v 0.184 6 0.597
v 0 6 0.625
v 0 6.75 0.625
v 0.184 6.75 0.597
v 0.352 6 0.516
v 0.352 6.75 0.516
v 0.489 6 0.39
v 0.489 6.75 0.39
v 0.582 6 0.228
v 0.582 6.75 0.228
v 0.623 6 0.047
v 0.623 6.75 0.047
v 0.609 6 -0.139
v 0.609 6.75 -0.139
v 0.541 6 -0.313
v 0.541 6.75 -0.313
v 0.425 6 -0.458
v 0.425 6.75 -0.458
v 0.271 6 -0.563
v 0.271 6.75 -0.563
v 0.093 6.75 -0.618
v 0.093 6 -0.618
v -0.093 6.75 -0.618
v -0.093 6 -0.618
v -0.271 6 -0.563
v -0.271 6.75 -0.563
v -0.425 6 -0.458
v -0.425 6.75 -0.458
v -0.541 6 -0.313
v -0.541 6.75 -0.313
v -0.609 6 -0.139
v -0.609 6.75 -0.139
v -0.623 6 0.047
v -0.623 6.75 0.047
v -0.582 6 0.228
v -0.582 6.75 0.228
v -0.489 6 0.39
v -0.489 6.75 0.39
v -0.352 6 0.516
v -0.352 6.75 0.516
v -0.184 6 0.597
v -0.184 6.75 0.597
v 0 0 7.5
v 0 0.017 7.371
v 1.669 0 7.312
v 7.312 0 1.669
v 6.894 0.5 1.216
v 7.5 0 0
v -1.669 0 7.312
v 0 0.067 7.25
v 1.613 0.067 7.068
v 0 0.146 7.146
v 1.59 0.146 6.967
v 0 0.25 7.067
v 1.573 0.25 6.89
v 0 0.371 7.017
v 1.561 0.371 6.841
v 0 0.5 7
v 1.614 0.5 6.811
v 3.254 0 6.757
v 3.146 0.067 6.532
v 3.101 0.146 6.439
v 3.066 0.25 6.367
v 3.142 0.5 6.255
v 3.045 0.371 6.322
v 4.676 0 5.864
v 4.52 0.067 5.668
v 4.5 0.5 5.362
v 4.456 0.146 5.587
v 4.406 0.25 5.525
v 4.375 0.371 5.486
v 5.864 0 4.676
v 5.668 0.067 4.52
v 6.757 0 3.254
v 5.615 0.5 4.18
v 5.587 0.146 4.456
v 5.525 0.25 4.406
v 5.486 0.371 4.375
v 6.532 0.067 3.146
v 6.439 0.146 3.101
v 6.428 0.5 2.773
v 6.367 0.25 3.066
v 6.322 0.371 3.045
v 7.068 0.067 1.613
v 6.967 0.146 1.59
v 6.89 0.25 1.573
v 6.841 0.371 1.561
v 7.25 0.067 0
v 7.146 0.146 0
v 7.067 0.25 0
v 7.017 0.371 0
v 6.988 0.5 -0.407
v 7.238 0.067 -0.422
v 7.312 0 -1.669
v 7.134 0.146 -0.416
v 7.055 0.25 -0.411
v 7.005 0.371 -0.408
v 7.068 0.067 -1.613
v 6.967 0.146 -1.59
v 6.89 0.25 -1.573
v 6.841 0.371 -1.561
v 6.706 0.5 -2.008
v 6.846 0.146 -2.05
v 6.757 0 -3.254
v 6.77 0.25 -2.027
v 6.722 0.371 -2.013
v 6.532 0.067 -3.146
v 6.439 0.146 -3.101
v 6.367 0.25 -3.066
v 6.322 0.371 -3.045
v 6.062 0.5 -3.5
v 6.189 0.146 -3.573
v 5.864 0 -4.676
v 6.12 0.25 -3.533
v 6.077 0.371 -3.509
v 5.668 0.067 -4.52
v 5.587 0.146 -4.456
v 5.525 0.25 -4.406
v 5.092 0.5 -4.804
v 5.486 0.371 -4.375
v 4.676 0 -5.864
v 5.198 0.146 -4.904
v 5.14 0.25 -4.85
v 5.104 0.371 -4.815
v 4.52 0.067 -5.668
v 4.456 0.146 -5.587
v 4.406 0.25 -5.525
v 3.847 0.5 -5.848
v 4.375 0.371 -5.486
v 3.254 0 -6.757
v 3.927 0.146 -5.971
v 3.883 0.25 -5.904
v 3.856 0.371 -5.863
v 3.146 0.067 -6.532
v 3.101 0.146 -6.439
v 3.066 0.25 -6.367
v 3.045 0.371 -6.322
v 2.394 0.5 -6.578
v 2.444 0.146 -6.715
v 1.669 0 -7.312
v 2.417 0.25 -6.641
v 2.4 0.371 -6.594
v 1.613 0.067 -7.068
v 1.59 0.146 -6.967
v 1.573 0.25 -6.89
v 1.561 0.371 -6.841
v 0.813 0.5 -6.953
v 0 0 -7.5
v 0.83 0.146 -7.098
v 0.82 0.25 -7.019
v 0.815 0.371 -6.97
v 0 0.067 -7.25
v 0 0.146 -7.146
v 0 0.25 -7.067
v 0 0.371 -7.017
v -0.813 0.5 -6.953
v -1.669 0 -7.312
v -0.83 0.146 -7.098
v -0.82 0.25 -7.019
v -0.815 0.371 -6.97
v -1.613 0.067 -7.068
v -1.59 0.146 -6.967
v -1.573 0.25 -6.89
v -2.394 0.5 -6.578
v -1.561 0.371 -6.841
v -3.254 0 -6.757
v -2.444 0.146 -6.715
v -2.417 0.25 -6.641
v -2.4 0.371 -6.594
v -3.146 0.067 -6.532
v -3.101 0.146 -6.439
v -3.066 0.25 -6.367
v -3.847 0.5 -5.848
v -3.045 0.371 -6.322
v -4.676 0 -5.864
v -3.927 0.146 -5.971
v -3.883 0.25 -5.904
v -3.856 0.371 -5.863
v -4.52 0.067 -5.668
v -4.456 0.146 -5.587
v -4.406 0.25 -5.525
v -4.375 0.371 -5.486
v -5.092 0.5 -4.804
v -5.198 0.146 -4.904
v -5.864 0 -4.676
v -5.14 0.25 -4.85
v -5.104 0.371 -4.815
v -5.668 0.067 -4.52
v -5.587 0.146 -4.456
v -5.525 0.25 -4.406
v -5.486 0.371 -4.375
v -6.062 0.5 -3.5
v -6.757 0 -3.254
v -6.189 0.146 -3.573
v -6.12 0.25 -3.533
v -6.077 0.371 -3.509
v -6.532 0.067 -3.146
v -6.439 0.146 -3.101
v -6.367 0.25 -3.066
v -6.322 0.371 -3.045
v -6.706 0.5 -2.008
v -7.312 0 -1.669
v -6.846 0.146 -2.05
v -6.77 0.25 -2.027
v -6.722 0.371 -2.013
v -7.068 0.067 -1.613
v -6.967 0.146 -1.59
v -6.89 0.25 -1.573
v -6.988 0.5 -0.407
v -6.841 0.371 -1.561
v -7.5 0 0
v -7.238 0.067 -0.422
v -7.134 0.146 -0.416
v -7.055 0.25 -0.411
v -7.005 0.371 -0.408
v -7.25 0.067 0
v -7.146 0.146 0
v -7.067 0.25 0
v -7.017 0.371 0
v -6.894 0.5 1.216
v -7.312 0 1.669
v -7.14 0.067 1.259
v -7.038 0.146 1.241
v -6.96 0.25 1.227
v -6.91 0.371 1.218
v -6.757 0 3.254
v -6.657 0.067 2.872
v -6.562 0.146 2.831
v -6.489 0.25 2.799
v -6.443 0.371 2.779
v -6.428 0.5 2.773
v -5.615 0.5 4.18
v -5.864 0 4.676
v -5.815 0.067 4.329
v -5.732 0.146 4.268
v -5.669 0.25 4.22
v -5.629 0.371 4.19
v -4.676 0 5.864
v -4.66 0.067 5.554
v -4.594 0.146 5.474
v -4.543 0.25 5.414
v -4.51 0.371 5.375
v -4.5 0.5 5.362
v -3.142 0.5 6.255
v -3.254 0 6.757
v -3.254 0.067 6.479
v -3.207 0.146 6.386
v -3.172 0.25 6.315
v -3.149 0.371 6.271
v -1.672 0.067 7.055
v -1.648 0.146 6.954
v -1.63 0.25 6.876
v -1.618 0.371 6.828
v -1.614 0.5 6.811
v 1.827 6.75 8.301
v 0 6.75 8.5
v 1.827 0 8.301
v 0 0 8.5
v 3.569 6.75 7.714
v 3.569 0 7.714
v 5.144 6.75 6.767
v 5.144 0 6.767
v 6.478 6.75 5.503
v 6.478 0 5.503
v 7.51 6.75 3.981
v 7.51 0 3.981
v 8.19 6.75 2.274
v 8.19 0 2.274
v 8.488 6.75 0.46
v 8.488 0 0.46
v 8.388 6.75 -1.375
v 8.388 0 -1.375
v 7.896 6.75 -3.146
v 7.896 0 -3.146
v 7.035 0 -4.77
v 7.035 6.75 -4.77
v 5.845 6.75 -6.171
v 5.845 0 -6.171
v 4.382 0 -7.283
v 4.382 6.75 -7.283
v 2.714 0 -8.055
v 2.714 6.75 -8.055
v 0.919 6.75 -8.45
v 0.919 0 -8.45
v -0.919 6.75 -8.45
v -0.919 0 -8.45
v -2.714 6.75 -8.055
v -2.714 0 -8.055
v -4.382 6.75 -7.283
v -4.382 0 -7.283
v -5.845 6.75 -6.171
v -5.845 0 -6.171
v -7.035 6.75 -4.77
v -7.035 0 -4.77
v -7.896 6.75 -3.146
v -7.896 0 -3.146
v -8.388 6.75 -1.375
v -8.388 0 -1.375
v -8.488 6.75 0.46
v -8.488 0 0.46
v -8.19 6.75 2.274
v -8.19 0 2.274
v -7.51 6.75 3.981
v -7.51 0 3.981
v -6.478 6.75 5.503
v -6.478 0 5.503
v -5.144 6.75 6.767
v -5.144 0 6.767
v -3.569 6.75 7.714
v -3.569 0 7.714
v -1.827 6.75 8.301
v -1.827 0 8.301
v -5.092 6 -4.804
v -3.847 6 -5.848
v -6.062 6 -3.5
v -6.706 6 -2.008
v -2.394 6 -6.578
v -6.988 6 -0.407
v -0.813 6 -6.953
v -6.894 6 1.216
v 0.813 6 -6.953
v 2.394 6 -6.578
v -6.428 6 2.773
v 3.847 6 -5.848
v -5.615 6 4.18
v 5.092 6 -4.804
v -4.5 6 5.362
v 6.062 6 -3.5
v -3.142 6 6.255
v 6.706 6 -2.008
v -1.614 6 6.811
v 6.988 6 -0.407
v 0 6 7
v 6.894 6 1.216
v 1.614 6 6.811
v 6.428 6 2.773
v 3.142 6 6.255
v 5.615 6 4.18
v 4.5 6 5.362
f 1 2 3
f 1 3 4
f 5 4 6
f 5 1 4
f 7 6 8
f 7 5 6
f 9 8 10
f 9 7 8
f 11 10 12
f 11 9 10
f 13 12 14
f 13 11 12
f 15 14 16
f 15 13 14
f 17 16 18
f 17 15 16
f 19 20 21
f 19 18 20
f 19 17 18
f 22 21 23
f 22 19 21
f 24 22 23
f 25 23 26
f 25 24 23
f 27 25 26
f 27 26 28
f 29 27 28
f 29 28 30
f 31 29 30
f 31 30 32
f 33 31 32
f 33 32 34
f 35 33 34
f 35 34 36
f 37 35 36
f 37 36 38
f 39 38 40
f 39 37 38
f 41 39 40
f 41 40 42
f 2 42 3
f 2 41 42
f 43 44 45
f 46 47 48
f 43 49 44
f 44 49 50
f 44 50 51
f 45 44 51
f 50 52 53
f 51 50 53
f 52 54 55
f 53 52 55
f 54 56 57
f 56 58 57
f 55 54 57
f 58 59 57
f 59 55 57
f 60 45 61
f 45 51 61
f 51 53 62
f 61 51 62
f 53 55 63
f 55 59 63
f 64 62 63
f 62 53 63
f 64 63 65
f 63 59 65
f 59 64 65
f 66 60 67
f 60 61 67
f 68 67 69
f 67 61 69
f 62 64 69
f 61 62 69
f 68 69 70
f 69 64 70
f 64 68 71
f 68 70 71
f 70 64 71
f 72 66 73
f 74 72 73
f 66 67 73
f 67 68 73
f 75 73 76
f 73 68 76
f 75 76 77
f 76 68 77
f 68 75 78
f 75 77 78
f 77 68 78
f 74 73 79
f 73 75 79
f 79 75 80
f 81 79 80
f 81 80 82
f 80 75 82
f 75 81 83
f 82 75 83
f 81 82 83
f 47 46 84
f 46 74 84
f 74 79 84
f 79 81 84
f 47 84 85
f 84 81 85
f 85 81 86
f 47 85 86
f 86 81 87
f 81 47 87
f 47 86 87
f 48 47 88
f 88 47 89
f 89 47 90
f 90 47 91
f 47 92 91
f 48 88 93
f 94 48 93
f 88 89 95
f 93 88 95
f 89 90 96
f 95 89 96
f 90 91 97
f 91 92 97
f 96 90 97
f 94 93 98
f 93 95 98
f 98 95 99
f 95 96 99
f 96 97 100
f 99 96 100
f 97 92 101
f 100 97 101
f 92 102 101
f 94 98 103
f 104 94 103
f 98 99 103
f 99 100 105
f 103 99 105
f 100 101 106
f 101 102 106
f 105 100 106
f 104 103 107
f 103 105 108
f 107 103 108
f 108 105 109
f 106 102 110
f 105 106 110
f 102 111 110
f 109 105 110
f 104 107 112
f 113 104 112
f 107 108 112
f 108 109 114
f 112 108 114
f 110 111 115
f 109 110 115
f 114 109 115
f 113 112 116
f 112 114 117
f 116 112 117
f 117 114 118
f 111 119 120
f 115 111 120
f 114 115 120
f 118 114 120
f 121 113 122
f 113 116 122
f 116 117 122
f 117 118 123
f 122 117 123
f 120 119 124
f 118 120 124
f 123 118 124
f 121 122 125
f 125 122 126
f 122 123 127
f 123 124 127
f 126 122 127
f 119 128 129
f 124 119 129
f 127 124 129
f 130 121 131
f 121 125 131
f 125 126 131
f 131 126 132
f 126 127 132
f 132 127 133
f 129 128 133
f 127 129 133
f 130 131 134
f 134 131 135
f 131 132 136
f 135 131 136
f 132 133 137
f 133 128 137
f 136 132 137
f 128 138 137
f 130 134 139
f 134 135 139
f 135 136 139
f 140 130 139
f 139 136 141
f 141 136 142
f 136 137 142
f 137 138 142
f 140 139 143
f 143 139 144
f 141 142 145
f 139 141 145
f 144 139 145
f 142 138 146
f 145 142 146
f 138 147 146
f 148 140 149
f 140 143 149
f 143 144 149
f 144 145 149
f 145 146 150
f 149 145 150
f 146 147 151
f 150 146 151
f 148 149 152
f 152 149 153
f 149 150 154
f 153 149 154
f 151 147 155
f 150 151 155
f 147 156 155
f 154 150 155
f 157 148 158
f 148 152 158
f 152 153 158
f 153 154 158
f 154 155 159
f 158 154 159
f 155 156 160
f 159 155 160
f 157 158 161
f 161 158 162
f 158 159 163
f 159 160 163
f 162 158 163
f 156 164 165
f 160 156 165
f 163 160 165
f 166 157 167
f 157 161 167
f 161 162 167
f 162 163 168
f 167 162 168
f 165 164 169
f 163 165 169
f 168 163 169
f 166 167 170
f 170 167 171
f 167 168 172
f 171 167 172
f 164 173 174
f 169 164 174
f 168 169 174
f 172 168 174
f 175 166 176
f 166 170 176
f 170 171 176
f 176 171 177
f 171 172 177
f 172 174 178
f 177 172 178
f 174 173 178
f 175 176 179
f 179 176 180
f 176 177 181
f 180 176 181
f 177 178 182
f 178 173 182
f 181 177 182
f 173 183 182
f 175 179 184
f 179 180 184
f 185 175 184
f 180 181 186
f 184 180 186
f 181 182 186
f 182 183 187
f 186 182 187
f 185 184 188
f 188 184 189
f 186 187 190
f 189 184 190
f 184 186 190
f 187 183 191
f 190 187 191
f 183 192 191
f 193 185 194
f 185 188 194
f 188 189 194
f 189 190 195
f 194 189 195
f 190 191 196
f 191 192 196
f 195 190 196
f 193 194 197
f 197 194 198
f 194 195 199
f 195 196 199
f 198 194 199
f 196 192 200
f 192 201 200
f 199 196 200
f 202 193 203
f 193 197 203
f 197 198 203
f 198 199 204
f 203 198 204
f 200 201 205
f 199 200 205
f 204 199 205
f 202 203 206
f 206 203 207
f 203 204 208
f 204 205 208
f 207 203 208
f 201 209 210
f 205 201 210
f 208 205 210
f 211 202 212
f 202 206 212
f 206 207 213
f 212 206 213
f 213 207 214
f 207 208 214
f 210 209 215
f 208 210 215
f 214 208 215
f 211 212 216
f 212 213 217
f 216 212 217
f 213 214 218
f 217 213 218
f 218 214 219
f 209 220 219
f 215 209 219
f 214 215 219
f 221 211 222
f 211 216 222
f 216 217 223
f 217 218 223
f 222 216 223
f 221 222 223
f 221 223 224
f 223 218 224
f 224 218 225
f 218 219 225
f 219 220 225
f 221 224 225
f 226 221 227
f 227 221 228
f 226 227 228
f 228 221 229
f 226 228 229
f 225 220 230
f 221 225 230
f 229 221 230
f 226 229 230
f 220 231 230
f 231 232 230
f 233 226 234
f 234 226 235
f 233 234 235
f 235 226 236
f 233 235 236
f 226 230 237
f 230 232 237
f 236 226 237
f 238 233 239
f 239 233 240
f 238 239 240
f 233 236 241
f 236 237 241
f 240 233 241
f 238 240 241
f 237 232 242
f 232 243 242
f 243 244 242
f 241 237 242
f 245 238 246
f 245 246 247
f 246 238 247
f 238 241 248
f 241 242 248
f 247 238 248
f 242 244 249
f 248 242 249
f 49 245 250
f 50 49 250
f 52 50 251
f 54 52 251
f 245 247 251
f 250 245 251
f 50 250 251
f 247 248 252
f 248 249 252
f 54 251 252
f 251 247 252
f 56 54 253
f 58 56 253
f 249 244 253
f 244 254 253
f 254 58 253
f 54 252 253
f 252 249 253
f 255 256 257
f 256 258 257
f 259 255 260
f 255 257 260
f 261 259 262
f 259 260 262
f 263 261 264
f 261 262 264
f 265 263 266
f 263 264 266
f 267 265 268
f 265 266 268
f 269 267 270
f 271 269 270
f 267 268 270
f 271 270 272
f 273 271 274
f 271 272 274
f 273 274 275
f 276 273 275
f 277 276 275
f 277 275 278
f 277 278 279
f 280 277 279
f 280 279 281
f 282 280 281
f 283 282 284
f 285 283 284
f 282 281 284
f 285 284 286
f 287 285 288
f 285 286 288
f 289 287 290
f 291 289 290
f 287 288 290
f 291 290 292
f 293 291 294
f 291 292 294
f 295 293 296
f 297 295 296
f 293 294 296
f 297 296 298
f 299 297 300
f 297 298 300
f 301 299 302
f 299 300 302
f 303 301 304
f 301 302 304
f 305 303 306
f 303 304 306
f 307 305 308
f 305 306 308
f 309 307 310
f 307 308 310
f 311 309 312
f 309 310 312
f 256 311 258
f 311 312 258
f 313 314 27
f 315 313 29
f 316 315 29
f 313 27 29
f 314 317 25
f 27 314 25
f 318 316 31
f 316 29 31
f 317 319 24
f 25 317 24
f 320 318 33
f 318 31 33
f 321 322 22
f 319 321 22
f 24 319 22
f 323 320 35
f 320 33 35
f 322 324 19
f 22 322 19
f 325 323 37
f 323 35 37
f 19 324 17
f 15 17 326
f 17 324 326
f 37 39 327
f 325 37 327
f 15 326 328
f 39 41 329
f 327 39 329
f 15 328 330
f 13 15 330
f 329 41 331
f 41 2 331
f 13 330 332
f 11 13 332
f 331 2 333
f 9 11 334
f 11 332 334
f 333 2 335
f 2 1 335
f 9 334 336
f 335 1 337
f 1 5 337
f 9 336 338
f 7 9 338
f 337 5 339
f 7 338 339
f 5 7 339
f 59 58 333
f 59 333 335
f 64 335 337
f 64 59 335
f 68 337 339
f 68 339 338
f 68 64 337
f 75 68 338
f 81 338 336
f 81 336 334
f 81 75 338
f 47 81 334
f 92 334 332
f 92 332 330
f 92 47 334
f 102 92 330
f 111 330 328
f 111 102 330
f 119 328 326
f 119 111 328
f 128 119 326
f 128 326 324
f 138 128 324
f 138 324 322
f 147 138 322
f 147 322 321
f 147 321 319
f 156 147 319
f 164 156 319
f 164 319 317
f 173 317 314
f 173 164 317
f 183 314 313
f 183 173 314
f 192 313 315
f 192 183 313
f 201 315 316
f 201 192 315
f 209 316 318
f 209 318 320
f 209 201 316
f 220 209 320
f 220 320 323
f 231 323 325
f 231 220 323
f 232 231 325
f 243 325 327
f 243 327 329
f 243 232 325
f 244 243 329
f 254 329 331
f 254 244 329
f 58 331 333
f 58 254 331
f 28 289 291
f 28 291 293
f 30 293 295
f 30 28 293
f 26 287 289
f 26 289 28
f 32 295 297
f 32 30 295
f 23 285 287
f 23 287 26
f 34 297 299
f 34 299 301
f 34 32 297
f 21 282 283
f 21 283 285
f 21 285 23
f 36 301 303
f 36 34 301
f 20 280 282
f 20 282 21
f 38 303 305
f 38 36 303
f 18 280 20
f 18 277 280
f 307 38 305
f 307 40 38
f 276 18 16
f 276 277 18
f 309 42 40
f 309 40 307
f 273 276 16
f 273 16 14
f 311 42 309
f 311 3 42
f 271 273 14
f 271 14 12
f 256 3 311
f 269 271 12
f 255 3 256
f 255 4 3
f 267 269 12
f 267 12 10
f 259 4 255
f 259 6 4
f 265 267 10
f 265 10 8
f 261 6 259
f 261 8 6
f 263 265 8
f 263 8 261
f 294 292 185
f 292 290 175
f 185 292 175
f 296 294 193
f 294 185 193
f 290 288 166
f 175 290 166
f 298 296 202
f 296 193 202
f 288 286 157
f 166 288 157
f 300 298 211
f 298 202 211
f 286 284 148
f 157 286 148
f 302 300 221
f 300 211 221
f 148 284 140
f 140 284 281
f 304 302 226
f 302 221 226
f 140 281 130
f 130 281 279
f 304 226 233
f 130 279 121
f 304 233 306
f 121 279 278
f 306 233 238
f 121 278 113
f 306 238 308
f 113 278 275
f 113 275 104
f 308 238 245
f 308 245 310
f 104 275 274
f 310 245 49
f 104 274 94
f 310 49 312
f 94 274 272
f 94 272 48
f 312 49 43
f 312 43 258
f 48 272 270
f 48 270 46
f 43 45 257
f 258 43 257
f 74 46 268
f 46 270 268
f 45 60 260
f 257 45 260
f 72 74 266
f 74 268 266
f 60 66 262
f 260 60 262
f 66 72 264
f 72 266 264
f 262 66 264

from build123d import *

# Parameters (mm, degrees)
SKETCH1_R               = 8.5
SKETCH1_R_2             = 7
BOSS_EXTRUDE1_DEPTH     = 6
SKETCH2_R               = 8.5
BOSS_EXTRUDE2_DEPTH     = 0.75
CUT_EXTRUDE1_DEPTH      = 14.786315679
CUT_EXTRUDE1_DEPTH_BACK = 14.786315679
SKETCH3_R               = 0.625
FILLET1_R               = 0.5


with BuildPart() as part:
    # Sketch1 → Boss-Extrude1 (new body)
    with BuildSketch(Plane(origin=(0, 0, 0), x_dir=(1, 0, 0), z_dir=(0, 1, 0))):
        with Locations(Location((0, 0, 0), (0, 0, 270))):
            Circle(SKETCH1_R)
        with Locations(Location((0, 0, 0), (0, 0, 270))):
            Circle(SKETCH1_R_2, mode=Mode.SUBTRACT)
    extrude(amount=BOSS_EXTRUDE1_DEPTH)

    # Sketch2 → Boss-Extrude2 (add)
    with BuildSketch(Plane(origin=(0, 6, 0), x_dir=(1, 0, 0), z_dir=(0, 1, 0))):
        with Locations(Location((0, 0, 0), (0, 0, 270))):
            Circle(SKETCH2_R)
    extrude(amount=BOSS_EXTRUDE2_DEPTH)

    # Sketch3 → Cut-Extrude1 (cut, two sides: drawn at the far end of the back side and taken through both)
    with BuildSketch(Plane(origin=(0, 6.75, 0), x_dir=(1, 0, 0), z_dir=(0, 1, 0)).offset(-CUT_EXTRUDE1_DEPTH_BACK)):
        with Locations(Location((0, 0, 0), (0, 0, 270))):
            Circle(SKETCH3_R)
    extrude(amount=CUT_EXTRUDE1_DEPTH + CUT_EXTRUDE1_DEPTH_BACK, mode=Mode.SUBTRACT)

    # Fillet1
    fillet1_edges = [part.edges().sort_by_distance(p)[0] for p in [
        (0, 0, -7),
    ]]
    fillet(fillet1_edges, radius=FILLET1_R)


solid = part.part
